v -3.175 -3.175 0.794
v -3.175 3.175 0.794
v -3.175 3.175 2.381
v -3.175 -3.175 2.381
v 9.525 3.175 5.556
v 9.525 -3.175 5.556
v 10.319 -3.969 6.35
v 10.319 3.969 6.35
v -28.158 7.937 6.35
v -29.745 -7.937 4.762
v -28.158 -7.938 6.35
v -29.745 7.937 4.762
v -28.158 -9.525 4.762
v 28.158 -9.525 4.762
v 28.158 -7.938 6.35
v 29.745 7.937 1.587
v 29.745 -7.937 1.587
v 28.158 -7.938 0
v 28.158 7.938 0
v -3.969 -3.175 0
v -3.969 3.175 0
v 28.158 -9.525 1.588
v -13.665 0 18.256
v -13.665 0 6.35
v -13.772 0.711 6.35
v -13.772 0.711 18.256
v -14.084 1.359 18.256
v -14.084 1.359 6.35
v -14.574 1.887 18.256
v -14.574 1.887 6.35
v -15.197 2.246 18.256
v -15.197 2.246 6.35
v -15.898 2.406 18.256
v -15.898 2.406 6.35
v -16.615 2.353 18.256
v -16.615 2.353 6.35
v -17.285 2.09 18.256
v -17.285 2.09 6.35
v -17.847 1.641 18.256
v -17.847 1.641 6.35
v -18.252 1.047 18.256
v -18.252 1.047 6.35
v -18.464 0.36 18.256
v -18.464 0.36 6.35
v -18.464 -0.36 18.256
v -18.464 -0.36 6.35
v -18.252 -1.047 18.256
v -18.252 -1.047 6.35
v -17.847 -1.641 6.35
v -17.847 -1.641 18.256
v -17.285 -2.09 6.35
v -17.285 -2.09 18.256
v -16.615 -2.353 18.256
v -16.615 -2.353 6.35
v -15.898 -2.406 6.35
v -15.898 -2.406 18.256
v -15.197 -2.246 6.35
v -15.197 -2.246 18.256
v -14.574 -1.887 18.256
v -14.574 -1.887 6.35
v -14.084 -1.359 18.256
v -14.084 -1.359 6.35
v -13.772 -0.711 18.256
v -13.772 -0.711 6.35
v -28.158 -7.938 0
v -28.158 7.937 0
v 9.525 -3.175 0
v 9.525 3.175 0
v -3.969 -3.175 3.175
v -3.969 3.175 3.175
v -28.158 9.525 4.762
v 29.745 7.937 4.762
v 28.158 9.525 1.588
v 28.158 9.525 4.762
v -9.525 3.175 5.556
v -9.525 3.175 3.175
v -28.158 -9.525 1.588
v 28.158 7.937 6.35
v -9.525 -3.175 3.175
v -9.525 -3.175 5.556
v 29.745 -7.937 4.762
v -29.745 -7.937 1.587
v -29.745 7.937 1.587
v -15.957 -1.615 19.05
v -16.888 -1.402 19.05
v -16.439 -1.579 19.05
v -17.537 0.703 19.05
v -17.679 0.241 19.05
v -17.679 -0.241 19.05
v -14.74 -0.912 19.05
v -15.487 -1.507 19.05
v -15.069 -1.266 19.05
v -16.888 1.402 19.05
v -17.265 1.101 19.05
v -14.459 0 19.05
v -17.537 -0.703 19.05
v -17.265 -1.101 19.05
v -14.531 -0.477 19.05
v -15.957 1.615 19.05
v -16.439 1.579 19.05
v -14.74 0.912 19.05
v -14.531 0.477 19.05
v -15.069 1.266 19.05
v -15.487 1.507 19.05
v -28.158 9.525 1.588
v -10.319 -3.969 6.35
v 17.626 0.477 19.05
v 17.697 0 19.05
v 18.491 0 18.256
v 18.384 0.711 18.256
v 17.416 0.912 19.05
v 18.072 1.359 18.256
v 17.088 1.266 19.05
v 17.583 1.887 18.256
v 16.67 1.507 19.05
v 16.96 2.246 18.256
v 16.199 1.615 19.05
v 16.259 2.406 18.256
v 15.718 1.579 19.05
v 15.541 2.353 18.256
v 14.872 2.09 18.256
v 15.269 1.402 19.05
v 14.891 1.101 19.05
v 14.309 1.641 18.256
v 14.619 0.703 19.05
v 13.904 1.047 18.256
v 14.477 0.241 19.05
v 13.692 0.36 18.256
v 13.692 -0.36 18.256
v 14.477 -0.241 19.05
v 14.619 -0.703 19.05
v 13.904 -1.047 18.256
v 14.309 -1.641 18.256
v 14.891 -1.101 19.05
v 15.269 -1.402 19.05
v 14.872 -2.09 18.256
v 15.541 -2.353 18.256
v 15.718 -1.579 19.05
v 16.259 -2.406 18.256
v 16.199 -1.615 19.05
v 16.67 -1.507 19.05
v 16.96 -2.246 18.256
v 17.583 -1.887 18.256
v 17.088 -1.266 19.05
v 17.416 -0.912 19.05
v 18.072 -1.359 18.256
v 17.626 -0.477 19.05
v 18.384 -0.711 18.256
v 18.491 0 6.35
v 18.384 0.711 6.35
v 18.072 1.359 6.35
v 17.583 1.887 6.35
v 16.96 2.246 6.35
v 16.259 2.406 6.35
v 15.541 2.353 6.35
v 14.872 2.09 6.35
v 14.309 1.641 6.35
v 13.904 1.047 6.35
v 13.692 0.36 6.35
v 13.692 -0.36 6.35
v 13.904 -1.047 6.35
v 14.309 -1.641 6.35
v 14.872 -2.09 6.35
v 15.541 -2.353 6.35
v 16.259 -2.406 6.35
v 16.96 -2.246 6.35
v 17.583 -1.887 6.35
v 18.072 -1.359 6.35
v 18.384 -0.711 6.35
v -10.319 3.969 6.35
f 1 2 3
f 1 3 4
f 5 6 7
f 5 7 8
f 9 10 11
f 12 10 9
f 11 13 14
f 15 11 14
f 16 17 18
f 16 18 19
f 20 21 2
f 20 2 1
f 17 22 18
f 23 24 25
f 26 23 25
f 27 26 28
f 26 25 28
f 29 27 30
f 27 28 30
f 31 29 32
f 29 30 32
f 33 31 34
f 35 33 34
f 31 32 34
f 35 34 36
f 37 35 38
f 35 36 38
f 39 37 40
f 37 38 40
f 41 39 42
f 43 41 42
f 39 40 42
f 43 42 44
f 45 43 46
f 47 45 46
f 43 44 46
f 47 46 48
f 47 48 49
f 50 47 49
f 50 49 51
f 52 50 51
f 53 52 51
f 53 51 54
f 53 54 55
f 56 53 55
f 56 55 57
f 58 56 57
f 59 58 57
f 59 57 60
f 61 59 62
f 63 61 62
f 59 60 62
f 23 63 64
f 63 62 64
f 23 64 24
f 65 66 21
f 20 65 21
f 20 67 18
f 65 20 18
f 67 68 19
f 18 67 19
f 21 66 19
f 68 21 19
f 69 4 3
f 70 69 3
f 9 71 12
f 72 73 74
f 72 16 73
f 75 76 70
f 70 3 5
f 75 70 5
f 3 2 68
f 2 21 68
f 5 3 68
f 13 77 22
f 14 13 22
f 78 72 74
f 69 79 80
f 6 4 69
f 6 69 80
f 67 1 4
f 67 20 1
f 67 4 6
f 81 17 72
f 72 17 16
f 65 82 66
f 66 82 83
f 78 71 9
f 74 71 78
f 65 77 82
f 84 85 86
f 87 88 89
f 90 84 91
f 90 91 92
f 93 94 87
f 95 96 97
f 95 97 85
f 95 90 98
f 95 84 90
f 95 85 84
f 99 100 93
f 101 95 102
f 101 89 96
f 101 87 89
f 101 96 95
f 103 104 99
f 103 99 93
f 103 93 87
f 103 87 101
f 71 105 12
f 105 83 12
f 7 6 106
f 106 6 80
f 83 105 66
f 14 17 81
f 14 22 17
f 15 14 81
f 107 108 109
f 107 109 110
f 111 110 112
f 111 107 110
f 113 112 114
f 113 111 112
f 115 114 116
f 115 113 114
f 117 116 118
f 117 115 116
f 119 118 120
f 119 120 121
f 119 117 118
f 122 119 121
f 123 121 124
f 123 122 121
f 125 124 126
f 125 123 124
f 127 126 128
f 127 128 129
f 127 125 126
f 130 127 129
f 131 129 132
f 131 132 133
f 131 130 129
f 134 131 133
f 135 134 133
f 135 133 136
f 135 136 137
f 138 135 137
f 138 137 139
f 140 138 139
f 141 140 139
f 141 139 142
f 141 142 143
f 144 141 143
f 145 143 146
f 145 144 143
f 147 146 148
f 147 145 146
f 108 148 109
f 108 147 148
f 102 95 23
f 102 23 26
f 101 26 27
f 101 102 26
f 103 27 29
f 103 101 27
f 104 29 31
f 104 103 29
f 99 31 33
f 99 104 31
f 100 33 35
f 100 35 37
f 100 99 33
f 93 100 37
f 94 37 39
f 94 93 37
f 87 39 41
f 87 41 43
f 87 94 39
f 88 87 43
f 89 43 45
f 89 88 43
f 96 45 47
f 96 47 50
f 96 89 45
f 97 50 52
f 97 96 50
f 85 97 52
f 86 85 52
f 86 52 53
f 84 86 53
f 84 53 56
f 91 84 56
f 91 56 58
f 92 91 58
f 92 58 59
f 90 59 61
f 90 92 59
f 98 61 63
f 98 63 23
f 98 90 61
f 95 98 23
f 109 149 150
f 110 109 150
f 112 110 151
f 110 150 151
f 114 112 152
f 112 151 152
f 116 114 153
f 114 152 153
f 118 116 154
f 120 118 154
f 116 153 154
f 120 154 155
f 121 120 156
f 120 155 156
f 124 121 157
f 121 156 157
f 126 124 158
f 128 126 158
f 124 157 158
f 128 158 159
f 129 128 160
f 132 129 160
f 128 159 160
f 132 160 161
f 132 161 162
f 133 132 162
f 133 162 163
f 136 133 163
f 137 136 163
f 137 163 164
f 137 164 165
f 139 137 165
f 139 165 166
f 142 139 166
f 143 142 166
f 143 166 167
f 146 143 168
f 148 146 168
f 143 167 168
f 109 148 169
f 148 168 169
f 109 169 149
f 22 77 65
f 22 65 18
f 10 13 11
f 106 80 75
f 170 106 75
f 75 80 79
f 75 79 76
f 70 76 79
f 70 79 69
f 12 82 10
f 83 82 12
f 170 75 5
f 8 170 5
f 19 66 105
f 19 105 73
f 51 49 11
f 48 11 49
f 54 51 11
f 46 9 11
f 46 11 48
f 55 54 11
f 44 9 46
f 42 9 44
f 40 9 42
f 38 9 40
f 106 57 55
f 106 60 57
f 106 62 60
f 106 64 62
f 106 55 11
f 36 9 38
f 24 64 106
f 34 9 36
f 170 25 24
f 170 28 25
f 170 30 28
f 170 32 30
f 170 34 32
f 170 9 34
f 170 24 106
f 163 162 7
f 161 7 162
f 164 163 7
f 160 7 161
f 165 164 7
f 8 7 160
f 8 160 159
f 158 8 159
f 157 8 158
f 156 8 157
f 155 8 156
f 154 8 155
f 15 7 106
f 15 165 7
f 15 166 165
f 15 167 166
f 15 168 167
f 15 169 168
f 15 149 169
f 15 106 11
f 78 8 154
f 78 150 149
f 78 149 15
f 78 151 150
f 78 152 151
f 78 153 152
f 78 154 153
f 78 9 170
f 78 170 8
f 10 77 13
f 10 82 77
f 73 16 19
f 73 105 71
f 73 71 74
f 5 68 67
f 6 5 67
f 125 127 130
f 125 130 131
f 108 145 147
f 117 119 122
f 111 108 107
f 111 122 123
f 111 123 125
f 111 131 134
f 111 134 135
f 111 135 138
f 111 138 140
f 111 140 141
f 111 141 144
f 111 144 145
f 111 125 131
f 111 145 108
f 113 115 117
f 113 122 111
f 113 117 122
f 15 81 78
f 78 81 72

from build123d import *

# Parameters (mm, degrees)
F0_W     = 59.490514
F0_H     = 19.05
F1_DEPTH = 6.35
F2_R     = 2.413
F3_DEPTH = 12.7
F4_W     = 19.05
F4_H     = 6.35
F5_DEPTH = 3.175
F6_W     = 12.7
F6_H     = 6.35
F7_DEPTH = 19.051
F8_SIZE  = 0.79375
F9_SIZE  = 1.5875
F10_SIZE = 0.79375


with BuildPart() as f1:
    # F0 (on Top) → F1 (new body)
    with BuildSketch(Plane.XY):
        Rectangle(F0_W, F0_H)
    extrude(amount=F1_DEPTH)

    # F2 (on face) → F3 (join)
    with BuildSketch(Plane.XY.offset(6.35)):
        with Locations((-16.0782, 0)):
            Circle(F2_R)
        with Locations((16.0782, 0)):
            Circle(F2_R)
    extrude(amount=F3_DEPTH)

    # F4 (on face) → F5 (cut)
    with BuildSketch(Plane.XY.offset(6.35)):
        Rectangle(F4_W, F4_H)
    extrude(amount=-F5_DEPTH, mode=Mode.SUBTRACT)

    # F6 (on face) → F7 (cut, through all)
    with BuildSketch(Plane(origin=(0, 0, 0), x_dir=(1, 0, 0), z_dir=(0, 0, -1))):
        with Locations((3.175, 0)):
            Rectangle(F6_W, F6_H)
    extrude(amount=-F7_DEPTH, mode=Mode.SUBTRACT)

    # F8
    f8_edges = [f1.edges().sort_by_distance(p)[0] for p in [
        (-3.175, 0, 3.175),
        (-3.175, 0, 0),
        (0, 3.175, 6.35),
        (9.525, 0, 6.35),
        (0, -3.175, 6.35),
        (-9.525, 0, 6.35),
    ]]
    chamfer(f8_edges, length=F8_SIZE)

    # F9
    f9_edges = [f1.edges().sort_by_distance(p)[0] for p in [
        (-29.745257, -9.525, 3.175),
        (29.745257, -9.525, 3.175),
        (0, -9.525, 0),
        (0, -9.525, 6.35),
        (29.745257, 9.525, 3.175),
        (29.745257, 0, 0),
        (29.745257, 0, 6.35),
        (-29.745257, 9.525, 3.175),
        (0, 9.525, 0),
        (0, 9.525, 6.35),
        (-29.745257, 0, 0),
        (-29.745257, 0, 6.35),
    ]]
    chamfer(f9_edges, length=F9_SIZE)

    # F10
    f10_edges = [f1.edges().sort_by_distance(p)[0] for p in [
        (13.6652, 0, 19.05),
        (-18.4912, 0, 19.05),
    ]]
    chamfer(f10_edges, length=F10_SIZE)


solid = f1.part
